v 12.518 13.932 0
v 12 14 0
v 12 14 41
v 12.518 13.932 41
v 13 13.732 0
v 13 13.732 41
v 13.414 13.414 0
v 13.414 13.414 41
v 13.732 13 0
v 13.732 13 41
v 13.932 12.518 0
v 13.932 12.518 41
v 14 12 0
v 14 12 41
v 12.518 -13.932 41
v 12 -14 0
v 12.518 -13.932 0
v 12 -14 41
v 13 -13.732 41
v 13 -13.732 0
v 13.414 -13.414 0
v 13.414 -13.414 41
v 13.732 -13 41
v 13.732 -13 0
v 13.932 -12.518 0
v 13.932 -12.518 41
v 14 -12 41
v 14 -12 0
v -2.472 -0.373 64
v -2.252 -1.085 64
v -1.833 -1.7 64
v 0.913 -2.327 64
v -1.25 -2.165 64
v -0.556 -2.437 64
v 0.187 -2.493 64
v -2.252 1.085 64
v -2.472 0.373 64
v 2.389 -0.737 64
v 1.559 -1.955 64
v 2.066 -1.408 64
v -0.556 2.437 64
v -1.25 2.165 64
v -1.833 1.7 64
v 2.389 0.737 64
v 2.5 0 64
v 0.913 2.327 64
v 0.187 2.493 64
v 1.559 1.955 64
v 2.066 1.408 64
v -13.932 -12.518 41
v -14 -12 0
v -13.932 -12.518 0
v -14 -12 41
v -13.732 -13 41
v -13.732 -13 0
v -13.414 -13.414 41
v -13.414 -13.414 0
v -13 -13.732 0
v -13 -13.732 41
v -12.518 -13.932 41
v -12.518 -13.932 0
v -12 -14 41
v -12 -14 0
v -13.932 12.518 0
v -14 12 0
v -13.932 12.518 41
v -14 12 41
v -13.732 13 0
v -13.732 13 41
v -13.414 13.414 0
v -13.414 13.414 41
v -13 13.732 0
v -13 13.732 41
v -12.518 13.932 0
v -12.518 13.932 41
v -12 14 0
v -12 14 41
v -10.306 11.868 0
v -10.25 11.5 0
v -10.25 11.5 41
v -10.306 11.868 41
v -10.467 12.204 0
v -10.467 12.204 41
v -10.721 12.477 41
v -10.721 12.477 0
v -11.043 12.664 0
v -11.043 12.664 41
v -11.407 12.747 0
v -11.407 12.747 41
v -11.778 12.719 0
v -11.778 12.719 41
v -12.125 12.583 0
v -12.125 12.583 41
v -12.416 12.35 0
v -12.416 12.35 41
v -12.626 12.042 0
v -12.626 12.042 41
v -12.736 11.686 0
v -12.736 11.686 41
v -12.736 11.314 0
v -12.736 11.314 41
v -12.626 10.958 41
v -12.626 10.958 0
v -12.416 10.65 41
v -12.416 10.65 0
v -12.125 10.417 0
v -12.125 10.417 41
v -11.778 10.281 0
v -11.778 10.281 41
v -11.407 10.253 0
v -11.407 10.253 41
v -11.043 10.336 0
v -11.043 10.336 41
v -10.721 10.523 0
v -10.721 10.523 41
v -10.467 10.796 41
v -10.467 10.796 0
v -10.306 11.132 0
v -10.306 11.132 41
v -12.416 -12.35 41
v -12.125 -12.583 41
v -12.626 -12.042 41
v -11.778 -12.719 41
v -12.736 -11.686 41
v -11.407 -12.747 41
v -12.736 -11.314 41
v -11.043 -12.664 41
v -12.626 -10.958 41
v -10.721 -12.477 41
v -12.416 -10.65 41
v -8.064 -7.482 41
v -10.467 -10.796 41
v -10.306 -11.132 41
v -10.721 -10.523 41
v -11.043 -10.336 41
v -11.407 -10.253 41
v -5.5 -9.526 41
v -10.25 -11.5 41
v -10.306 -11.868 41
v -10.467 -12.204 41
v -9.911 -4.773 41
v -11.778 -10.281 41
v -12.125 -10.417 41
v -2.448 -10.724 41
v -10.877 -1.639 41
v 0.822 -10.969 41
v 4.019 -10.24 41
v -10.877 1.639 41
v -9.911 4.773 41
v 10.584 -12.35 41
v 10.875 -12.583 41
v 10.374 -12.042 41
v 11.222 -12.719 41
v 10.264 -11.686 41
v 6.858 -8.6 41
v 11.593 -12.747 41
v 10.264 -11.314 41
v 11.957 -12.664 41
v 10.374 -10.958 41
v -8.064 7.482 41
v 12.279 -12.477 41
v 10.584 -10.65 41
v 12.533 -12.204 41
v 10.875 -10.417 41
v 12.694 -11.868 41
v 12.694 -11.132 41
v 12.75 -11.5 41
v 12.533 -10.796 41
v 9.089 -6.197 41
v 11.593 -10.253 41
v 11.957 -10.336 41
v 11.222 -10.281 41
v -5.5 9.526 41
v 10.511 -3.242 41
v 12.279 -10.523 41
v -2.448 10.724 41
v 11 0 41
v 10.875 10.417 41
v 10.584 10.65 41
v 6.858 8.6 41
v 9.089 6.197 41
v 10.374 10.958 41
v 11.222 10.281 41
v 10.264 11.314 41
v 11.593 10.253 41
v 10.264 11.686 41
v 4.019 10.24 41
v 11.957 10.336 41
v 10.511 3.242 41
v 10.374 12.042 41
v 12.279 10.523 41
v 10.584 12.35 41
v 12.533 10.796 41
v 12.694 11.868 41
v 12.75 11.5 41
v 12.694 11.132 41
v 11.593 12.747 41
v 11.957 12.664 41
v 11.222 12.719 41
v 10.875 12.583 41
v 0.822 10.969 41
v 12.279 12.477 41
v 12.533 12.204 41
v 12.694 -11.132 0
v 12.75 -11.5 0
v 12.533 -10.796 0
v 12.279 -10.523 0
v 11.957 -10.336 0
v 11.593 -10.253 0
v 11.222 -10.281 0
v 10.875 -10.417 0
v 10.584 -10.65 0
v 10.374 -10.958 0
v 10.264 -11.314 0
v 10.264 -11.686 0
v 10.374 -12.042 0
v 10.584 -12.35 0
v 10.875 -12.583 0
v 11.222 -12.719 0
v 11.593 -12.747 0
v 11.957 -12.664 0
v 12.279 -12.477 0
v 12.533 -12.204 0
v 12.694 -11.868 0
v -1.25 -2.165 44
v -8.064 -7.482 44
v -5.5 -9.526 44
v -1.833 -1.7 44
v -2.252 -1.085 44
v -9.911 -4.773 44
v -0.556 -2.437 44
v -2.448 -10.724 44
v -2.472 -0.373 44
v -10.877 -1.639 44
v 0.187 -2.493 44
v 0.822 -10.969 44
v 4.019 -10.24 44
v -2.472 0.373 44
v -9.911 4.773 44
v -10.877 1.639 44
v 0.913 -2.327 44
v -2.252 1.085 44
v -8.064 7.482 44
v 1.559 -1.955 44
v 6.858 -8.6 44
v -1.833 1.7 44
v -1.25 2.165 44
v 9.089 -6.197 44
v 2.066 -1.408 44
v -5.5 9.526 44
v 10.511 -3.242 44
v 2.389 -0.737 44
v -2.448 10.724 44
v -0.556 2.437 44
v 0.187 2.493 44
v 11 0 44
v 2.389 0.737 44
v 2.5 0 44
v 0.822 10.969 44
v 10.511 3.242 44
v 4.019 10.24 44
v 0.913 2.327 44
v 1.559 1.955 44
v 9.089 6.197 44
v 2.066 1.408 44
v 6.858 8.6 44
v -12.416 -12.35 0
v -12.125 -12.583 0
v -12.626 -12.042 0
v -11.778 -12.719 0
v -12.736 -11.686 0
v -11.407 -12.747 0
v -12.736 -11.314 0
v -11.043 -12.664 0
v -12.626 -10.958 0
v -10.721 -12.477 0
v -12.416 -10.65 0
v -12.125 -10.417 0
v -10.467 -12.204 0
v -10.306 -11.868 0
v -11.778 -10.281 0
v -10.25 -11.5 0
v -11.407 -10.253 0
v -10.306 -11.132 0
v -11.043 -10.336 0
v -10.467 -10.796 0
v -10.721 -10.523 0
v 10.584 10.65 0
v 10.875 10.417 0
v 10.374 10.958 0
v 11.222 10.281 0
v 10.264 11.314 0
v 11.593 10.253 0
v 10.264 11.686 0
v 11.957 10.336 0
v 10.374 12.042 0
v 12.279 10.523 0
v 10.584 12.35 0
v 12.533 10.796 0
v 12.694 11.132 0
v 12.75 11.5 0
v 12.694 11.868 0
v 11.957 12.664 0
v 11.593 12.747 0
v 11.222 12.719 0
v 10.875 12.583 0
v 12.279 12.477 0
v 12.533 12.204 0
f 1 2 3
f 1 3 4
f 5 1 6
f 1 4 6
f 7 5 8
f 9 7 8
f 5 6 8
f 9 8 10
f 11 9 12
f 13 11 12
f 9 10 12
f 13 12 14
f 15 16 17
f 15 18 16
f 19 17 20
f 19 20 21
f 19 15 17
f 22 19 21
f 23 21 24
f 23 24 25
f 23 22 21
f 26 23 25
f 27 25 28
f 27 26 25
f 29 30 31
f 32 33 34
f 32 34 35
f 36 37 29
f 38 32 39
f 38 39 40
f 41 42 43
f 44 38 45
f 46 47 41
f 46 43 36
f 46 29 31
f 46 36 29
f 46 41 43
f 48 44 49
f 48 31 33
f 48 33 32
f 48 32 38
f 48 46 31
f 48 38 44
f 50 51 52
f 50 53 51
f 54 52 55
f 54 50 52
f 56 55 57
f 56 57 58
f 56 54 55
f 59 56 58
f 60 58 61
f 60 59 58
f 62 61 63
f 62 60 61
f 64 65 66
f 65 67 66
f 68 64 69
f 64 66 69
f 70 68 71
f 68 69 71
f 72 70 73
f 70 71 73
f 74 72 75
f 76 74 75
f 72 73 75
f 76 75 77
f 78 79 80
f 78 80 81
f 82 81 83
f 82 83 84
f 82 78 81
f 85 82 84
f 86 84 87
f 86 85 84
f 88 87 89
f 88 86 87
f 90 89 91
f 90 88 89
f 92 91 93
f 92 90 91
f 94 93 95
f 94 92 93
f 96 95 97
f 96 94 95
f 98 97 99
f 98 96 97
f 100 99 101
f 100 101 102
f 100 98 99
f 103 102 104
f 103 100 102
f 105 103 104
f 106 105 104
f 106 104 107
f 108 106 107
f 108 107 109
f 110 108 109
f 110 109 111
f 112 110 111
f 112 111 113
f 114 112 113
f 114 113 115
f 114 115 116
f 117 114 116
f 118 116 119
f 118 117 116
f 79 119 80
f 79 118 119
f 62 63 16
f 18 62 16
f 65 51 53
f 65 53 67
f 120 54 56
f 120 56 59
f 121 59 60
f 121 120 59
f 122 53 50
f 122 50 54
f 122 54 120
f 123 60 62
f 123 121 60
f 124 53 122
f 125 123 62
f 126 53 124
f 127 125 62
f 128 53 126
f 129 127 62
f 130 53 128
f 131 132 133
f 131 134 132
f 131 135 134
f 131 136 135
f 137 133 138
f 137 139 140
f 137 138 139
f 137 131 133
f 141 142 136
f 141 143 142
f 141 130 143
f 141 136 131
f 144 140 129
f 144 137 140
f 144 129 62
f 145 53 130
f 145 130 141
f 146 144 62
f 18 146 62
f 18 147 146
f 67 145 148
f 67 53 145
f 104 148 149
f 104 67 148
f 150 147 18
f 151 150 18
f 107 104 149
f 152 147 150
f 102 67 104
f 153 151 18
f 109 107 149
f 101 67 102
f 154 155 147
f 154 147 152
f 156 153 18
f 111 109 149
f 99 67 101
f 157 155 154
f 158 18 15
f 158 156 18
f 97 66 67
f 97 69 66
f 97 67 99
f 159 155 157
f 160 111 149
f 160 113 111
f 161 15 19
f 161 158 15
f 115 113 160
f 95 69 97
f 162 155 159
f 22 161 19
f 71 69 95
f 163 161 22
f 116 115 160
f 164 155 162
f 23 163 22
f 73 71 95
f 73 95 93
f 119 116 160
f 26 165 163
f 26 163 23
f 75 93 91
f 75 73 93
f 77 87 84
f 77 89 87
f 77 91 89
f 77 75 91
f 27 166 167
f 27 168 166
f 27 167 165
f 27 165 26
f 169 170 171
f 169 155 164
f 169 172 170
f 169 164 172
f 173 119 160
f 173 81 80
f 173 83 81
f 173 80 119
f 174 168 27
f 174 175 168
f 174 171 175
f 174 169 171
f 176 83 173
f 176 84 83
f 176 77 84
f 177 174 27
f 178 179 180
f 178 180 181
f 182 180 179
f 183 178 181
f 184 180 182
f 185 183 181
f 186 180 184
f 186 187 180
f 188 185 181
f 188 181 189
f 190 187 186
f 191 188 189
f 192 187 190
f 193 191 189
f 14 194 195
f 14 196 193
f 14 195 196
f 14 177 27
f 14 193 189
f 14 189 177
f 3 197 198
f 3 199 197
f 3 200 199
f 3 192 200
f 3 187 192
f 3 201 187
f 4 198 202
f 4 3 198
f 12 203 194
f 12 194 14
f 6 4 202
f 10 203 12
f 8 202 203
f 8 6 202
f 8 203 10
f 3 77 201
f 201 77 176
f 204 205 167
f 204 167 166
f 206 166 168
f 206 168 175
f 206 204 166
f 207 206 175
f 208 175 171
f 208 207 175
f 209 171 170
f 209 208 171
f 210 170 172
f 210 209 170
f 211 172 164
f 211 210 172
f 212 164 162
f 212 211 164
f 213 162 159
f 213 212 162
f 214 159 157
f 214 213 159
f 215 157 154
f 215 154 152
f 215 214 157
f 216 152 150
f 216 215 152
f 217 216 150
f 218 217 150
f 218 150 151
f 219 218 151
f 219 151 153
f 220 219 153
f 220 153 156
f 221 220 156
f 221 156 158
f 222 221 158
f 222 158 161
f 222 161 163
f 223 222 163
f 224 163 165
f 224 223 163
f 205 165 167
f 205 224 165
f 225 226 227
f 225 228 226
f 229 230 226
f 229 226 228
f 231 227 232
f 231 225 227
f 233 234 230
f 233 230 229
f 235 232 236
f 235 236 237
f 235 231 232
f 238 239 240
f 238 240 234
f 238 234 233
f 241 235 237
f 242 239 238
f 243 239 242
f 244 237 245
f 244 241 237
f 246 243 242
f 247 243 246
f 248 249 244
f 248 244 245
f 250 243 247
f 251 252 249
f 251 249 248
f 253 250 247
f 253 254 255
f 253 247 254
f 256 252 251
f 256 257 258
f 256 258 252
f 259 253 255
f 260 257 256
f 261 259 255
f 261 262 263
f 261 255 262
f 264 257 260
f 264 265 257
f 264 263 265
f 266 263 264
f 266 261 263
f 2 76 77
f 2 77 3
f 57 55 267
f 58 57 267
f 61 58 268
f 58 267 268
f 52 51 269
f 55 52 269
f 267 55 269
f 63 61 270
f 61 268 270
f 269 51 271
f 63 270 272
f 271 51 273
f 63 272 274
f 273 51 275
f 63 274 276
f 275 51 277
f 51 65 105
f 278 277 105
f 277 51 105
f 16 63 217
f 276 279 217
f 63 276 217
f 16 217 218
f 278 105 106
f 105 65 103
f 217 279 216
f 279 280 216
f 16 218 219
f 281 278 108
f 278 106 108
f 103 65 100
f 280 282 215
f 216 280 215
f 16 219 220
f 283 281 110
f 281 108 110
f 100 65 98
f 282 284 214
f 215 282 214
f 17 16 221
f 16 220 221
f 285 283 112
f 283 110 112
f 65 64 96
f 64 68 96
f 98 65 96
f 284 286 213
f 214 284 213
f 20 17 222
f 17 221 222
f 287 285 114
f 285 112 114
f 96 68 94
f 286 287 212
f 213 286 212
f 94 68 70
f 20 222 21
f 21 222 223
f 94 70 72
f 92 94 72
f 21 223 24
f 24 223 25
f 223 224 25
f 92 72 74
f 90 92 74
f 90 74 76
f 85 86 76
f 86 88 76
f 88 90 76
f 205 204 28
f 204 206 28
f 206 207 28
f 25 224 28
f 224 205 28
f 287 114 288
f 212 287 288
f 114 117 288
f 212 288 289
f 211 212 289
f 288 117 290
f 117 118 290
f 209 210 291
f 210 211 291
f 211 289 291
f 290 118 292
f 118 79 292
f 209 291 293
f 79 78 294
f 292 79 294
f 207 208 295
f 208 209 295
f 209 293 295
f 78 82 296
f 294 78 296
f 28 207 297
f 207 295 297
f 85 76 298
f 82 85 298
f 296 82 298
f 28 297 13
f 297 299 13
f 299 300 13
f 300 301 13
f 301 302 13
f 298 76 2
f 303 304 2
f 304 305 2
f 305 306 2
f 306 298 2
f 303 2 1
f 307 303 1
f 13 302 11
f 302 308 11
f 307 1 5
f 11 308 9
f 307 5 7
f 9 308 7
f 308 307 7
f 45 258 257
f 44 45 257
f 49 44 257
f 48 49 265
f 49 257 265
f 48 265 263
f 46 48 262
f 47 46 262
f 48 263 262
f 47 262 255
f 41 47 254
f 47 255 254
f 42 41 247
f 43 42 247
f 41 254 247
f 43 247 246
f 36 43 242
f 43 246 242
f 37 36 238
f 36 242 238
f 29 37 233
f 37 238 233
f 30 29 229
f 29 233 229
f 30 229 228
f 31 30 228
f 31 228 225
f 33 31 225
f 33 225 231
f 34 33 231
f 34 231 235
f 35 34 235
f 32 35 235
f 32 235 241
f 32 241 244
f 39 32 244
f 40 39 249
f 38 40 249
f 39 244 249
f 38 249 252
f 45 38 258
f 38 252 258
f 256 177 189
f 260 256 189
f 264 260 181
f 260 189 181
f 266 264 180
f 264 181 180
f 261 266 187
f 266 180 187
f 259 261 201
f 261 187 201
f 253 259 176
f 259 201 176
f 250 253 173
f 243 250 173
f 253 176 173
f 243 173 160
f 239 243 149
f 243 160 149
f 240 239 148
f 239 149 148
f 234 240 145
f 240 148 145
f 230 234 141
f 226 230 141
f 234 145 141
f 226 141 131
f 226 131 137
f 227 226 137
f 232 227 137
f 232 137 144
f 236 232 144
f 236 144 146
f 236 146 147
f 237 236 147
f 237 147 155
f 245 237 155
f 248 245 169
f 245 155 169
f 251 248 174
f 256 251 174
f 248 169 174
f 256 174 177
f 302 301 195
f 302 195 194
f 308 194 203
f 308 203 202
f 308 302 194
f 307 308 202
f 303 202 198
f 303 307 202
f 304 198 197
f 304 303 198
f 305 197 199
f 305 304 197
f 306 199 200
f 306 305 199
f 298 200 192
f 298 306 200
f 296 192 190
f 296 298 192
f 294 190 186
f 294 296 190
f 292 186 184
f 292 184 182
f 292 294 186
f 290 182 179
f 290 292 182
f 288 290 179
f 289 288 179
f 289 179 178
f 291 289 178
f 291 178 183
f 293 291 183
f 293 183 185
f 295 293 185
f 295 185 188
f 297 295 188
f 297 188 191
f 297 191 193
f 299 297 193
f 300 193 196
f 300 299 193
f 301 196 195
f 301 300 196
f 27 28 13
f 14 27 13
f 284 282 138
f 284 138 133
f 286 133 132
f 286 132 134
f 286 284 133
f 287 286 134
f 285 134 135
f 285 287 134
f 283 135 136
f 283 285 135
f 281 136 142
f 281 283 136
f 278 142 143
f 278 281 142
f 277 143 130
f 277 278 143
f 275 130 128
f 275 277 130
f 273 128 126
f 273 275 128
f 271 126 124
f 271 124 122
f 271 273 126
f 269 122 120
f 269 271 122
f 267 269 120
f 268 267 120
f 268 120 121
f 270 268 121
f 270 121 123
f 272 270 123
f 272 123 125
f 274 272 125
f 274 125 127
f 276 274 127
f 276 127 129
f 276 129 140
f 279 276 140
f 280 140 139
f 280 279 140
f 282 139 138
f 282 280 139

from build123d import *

# Parameters (mm, degrees)
SKETCH_1_W      = 28
SKETCH_1_H      = 28
SKETCH_1_R      = 1.25
EXTRUDE_1_DEPTH = 41
SKETCH_2_R      = 11
EXTRUDE_2_DEPTH = 3
SKETCH_3_R      = 2.5
EXTRUDE_3_DEPTH = 20
FILLET_1_R      = 2


with BuildPart() as part:
    # 草图1 → 凸台-拉伸1 (new body)
    with BuildSketch(Plane.XY):
        Rectangle(SKETCH_1_W, SKETCH_1_H)
        with Locations((-11.5, 11.5)):
            Circle(SKETCH_1_R, mode=Mode.SUBTRACT)
        with Locations((11.5, 11.5)):
            Circle(SKETCH_1_R, mode=Mode.SUBTRACT)
        with Locations((11.5, -11.5)):
            Circle(SKETCH_1_R, mode=Mode.SUBTRACT)
        with Locations((-11.5, -11.5)):
            Circle(SKETCH_1_R, mode=Mode.SUBTRACT)
    extrude(amount=EXTRUDE_1_DEPTH)

    # 草图2 → 凸台-拉伸2 (add)
    with BuildSketch(Plane.XY.offset(41)):
        Circle(SKETCH_2_R)
    extrude(amount=EXTRUDE_2_DEPTH)

    # 草图3 → 凸台-拉伸3 (add)
    with BuildSketch(Plane.XY.offset(44)):
        Circle(SKETCH_3_R)
    extrude(amount=EXTRUDE_3_DEPTH)

    # 圆角1
    fillet_1_edges = [part.edges().sort_by_distance(p)[0] for p in [
        (14, -14, 20.5),
        (-14, -14, 20.5),
        (-14, 14, 20.5),
        (14, 14, 20.5),
    ]]
    fillet(fillet_1_edges, radius=FILLET_1_R)


solid = part.part
